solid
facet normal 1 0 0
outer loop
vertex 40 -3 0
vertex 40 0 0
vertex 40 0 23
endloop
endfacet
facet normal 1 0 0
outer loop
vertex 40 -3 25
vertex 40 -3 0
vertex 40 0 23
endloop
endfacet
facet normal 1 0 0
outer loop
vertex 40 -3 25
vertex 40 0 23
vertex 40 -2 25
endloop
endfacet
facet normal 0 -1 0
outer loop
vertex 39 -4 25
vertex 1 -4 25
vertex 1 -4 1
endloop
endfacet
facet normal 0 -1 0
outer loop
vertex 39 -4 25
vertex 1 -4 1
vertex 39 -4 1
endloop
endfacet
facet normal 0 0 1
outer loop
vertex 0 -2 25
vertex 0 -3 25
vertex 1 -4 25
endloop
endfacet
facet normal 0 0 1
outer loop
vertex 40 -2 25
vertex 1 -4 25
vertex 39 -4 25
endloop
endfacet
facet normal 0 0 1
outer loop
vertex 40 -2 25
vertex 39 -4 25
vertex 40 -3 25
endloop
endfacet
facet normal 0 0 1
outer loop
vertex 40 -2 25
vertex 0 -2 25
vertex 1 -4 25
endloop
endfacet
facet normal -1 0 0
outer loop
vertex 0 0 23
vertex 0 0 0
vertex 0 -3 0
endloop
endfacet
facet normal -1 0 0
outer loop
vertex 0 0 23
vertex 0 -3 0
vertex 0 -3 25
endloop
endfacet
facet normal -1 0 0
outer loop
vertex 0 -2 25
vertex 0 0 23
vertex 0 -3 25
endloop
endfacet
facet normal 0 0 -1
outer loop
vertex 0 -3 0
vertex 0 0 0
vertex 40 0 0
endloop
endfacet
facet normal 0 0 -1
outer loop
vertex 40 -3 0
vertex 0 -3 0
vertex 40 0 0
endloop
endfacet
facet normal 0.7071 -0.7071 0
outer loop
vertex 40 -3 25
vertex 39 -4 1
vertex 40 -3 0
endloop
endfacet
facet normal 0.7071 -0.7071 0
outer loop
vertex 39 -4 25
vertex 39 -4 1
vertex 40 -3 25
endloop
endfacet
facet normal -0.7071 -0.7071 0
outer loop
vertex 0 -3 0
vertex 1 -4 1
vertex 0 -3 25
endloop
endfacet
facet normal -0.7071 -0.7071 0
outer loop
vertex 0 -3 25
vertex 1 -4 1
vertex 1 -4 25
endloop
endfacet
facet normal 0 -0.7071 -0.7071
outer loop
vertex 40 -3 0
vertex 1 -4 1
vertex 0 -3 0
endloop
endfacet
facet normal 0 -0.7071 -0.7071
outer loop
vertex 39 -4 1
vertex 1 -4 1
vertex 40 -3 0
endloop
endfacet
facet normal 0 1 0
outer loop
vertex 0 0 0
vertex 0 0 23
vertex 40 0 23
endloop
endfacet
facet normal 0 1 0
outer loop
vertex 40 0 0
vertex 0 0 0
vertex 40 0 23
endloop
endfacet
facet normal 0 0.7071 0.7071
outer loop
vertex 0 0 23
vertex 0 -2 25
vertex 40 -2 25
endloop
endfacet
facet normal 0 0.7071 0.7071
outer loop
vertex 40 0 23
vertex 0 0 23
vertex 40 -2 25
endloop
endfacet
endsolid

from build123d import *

# Parameters (mm, degrees)
F0_W     = 40
F0_H     = 25
F1_DEPTH = 4
F2_SIZE  = 1
F3_SIZE  = 2


with BuildPart() as f1:
    # F0 (on Front) → F1 (new body)
    with BuildSketch(Plane.XZ):
        with Locations((20, 12.5)):
            Rectangle(F0_W, F0_H)
    extrude(amount=F1_DEPTH)

    # F2
    f2_edges = [f1.edges().sort_by_distance(p)[0] for p in [
        (0, -4, 12.5),
        (20, -4, 0),
        (40, -4, 12.5),
    ]]
    chamfer(f2_edges, length=F2_SIZE)

    # F3
    f3_edges = [f1.edges().sort_by_distance(p)[0] for p in [
        (20, 0, 25),
    ]]
    chamfer(f3_edges, length=F3_SIZE)


solid = f1.part
